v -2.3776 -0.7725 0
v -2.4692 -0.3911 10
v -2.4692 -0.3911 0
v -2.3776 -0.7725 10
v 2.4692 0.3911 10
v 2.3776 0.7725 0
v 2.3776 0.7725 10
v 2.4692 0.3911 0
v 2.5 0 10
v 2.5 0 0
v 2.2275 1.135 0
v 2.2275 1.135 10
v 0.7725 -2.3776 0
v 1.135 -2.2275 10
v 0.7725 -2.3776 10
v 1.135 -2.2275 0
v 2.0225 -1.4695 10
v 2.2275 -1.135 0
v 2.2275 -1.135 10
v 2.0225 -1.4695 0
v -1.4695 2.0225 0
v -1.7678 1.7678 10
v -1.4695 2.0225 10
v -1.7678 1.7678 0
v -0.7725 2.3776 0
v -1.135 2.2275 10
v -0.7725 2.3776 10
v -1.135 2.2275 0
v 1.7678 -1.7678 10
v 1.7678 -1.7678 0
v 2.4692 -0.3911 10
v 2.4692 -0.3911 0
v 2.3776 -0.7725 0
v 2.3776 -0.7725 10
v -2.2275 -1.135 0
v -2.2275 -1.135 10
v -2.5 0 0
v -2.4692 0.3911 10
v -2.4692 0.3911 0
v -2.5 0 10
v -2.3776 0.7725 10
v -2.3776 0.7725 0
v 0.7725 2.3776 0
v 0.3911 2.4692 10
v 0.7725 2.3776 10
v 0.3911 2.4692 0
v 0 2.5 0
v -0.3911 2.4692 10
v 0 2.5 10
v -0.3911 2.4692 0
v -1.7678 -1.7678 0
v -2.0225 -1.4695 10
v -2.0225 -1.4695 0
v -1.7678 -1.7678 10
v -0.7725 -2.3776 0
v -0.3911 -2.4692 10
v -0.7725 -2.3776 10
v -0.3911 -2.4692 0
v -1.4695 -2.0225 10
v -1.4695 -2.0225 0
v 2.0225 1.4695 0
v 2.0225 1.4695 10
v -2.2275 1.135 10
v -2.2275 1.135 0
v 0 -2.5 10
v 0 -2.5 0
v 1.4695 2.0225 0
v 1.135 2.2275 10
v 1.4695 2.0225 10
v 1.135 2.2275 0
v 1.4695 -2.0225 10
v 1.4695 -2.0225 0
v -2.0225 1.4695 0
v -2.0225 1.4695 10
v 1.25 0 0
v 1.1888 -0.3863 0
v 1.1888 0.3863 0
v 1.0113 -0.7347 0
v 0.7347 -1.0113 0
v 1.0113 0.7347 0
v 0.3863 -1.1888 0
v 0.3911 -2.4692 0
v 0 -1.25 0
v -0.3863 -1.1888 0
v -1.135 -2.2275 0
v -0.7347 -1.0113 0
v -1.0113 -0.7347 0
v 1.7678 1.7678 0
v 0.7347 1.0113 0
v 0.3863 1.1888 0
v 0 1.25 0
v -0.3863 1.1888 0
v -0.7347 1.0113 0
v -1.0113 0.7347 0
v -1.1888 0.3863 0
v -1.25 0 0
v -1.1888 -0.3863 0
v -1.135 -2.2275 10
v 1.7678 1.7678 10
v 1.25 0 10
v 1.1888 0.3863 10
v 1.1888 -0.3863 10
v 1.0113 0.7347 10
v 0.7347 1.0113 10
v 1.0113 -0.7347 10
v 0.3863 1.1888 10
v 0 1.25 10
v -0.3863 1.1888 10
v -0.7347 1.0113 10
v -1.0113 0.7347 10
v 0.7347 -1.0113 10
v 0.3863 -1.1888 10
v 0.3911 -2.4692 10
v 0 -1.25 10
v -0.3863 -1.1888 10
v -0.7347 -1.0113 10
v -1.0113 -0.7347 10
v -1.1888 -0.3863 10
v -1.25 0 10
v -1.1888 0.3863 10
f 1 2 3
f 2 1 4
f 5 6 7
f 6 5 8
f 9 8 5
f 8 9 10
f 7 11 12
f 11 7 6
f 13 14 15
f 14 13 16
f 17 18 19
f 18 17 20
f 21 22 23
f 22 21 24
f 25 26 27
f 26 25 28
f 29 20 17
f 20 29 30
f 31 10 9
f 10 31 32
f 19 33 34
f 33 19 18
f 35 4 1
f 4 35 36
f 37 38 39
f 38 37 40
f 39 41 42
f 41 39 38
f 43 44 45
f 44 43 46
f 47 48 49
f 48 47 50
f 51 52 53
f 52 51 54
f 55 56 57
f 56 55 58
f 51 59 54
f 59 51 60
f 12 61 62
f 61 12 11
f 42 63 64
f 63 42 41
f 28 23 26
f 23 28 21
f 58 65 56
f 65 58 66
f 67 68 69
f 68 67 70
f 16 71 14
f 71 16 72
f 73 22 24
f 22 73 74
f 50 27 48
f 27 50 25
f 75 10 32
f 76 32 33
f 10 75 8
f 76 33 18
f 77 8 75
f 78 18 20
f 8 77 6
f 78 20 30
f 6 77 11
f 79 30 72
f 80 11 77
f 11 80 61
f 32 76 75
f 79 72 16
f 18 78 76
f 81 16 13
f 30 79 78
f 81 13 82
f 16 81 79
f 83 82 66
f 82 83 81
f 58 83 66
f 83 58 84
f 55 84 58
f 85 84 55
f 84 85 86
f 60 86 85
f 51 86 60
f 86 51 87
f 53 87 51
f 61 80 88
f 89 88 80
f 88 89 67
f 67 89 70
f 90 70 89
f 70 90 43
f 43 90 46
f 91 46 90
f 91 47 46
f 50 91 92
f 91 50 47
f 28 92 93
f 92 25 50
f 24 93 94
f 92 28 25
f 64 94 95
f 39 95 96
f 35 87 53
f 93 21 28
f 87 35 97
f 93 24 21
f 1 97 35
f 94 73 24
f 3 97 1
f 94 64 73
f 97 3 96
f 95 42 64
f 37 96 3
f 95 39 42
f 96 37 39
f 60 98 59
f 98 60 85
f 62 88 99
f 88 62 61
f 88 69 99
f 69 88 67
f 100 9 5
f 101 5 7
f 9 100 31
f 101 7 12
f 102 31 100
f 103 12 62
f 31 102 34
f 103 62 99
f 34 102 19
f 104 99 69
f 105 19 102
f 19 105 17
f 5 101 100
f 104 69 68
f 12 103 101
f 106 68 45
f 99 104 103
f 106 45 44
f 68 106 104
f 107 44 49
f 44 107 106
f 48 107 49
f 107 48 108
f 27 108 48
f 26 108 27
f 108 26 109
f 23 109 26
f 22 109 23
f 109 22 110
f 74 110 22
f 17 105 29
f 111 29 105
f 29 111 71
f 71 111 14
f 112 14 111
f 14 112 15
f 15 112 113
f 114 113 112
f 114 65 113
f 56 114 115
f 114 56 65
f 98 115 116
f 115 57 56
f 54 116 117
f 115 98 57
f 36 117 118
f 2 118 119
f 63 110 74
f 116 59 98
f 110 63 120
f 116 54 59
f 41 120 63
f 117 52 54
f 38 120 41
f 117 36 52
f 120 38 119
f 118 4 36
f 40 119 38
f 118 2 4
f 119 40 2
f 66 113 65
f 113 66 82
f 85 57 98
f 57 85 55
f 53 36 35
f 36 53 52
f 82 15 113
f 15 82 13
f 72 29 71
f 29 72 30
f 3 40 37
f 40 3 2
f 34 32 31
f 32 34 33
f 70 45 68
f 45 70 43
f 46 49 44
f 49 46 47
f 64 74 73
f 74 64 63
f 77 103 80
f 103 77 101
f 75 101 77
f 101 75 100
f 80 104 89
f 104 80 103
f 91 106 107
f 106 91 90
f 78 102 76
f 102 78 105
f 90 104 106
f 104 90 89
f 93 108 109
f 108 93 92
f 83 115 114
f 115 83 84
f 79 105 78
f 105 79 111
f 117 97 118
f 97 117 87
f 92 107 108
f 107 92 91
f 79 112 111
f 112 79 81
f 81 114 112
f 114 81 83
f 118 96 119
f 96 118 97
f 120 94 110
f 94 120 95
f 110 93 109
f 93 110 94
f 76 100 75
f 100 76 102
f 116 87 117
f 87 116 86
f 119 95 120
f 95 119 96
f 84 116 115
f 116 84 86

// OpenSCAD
// Render Controls
$fa = 1;
$fs = 0.4;

// Dimensions
standoffRadius = 2.5;
standoffHeight = 10;
screwSize = 2.5;

// Module
module standoff() {
    difference() {
        cylinder(r=standoffRadius, h=standoffHeight);
        cylinder(r=screwSize / 2, h=standoffHeight);
    }
}

// Model
render() {
    standoff();
}
